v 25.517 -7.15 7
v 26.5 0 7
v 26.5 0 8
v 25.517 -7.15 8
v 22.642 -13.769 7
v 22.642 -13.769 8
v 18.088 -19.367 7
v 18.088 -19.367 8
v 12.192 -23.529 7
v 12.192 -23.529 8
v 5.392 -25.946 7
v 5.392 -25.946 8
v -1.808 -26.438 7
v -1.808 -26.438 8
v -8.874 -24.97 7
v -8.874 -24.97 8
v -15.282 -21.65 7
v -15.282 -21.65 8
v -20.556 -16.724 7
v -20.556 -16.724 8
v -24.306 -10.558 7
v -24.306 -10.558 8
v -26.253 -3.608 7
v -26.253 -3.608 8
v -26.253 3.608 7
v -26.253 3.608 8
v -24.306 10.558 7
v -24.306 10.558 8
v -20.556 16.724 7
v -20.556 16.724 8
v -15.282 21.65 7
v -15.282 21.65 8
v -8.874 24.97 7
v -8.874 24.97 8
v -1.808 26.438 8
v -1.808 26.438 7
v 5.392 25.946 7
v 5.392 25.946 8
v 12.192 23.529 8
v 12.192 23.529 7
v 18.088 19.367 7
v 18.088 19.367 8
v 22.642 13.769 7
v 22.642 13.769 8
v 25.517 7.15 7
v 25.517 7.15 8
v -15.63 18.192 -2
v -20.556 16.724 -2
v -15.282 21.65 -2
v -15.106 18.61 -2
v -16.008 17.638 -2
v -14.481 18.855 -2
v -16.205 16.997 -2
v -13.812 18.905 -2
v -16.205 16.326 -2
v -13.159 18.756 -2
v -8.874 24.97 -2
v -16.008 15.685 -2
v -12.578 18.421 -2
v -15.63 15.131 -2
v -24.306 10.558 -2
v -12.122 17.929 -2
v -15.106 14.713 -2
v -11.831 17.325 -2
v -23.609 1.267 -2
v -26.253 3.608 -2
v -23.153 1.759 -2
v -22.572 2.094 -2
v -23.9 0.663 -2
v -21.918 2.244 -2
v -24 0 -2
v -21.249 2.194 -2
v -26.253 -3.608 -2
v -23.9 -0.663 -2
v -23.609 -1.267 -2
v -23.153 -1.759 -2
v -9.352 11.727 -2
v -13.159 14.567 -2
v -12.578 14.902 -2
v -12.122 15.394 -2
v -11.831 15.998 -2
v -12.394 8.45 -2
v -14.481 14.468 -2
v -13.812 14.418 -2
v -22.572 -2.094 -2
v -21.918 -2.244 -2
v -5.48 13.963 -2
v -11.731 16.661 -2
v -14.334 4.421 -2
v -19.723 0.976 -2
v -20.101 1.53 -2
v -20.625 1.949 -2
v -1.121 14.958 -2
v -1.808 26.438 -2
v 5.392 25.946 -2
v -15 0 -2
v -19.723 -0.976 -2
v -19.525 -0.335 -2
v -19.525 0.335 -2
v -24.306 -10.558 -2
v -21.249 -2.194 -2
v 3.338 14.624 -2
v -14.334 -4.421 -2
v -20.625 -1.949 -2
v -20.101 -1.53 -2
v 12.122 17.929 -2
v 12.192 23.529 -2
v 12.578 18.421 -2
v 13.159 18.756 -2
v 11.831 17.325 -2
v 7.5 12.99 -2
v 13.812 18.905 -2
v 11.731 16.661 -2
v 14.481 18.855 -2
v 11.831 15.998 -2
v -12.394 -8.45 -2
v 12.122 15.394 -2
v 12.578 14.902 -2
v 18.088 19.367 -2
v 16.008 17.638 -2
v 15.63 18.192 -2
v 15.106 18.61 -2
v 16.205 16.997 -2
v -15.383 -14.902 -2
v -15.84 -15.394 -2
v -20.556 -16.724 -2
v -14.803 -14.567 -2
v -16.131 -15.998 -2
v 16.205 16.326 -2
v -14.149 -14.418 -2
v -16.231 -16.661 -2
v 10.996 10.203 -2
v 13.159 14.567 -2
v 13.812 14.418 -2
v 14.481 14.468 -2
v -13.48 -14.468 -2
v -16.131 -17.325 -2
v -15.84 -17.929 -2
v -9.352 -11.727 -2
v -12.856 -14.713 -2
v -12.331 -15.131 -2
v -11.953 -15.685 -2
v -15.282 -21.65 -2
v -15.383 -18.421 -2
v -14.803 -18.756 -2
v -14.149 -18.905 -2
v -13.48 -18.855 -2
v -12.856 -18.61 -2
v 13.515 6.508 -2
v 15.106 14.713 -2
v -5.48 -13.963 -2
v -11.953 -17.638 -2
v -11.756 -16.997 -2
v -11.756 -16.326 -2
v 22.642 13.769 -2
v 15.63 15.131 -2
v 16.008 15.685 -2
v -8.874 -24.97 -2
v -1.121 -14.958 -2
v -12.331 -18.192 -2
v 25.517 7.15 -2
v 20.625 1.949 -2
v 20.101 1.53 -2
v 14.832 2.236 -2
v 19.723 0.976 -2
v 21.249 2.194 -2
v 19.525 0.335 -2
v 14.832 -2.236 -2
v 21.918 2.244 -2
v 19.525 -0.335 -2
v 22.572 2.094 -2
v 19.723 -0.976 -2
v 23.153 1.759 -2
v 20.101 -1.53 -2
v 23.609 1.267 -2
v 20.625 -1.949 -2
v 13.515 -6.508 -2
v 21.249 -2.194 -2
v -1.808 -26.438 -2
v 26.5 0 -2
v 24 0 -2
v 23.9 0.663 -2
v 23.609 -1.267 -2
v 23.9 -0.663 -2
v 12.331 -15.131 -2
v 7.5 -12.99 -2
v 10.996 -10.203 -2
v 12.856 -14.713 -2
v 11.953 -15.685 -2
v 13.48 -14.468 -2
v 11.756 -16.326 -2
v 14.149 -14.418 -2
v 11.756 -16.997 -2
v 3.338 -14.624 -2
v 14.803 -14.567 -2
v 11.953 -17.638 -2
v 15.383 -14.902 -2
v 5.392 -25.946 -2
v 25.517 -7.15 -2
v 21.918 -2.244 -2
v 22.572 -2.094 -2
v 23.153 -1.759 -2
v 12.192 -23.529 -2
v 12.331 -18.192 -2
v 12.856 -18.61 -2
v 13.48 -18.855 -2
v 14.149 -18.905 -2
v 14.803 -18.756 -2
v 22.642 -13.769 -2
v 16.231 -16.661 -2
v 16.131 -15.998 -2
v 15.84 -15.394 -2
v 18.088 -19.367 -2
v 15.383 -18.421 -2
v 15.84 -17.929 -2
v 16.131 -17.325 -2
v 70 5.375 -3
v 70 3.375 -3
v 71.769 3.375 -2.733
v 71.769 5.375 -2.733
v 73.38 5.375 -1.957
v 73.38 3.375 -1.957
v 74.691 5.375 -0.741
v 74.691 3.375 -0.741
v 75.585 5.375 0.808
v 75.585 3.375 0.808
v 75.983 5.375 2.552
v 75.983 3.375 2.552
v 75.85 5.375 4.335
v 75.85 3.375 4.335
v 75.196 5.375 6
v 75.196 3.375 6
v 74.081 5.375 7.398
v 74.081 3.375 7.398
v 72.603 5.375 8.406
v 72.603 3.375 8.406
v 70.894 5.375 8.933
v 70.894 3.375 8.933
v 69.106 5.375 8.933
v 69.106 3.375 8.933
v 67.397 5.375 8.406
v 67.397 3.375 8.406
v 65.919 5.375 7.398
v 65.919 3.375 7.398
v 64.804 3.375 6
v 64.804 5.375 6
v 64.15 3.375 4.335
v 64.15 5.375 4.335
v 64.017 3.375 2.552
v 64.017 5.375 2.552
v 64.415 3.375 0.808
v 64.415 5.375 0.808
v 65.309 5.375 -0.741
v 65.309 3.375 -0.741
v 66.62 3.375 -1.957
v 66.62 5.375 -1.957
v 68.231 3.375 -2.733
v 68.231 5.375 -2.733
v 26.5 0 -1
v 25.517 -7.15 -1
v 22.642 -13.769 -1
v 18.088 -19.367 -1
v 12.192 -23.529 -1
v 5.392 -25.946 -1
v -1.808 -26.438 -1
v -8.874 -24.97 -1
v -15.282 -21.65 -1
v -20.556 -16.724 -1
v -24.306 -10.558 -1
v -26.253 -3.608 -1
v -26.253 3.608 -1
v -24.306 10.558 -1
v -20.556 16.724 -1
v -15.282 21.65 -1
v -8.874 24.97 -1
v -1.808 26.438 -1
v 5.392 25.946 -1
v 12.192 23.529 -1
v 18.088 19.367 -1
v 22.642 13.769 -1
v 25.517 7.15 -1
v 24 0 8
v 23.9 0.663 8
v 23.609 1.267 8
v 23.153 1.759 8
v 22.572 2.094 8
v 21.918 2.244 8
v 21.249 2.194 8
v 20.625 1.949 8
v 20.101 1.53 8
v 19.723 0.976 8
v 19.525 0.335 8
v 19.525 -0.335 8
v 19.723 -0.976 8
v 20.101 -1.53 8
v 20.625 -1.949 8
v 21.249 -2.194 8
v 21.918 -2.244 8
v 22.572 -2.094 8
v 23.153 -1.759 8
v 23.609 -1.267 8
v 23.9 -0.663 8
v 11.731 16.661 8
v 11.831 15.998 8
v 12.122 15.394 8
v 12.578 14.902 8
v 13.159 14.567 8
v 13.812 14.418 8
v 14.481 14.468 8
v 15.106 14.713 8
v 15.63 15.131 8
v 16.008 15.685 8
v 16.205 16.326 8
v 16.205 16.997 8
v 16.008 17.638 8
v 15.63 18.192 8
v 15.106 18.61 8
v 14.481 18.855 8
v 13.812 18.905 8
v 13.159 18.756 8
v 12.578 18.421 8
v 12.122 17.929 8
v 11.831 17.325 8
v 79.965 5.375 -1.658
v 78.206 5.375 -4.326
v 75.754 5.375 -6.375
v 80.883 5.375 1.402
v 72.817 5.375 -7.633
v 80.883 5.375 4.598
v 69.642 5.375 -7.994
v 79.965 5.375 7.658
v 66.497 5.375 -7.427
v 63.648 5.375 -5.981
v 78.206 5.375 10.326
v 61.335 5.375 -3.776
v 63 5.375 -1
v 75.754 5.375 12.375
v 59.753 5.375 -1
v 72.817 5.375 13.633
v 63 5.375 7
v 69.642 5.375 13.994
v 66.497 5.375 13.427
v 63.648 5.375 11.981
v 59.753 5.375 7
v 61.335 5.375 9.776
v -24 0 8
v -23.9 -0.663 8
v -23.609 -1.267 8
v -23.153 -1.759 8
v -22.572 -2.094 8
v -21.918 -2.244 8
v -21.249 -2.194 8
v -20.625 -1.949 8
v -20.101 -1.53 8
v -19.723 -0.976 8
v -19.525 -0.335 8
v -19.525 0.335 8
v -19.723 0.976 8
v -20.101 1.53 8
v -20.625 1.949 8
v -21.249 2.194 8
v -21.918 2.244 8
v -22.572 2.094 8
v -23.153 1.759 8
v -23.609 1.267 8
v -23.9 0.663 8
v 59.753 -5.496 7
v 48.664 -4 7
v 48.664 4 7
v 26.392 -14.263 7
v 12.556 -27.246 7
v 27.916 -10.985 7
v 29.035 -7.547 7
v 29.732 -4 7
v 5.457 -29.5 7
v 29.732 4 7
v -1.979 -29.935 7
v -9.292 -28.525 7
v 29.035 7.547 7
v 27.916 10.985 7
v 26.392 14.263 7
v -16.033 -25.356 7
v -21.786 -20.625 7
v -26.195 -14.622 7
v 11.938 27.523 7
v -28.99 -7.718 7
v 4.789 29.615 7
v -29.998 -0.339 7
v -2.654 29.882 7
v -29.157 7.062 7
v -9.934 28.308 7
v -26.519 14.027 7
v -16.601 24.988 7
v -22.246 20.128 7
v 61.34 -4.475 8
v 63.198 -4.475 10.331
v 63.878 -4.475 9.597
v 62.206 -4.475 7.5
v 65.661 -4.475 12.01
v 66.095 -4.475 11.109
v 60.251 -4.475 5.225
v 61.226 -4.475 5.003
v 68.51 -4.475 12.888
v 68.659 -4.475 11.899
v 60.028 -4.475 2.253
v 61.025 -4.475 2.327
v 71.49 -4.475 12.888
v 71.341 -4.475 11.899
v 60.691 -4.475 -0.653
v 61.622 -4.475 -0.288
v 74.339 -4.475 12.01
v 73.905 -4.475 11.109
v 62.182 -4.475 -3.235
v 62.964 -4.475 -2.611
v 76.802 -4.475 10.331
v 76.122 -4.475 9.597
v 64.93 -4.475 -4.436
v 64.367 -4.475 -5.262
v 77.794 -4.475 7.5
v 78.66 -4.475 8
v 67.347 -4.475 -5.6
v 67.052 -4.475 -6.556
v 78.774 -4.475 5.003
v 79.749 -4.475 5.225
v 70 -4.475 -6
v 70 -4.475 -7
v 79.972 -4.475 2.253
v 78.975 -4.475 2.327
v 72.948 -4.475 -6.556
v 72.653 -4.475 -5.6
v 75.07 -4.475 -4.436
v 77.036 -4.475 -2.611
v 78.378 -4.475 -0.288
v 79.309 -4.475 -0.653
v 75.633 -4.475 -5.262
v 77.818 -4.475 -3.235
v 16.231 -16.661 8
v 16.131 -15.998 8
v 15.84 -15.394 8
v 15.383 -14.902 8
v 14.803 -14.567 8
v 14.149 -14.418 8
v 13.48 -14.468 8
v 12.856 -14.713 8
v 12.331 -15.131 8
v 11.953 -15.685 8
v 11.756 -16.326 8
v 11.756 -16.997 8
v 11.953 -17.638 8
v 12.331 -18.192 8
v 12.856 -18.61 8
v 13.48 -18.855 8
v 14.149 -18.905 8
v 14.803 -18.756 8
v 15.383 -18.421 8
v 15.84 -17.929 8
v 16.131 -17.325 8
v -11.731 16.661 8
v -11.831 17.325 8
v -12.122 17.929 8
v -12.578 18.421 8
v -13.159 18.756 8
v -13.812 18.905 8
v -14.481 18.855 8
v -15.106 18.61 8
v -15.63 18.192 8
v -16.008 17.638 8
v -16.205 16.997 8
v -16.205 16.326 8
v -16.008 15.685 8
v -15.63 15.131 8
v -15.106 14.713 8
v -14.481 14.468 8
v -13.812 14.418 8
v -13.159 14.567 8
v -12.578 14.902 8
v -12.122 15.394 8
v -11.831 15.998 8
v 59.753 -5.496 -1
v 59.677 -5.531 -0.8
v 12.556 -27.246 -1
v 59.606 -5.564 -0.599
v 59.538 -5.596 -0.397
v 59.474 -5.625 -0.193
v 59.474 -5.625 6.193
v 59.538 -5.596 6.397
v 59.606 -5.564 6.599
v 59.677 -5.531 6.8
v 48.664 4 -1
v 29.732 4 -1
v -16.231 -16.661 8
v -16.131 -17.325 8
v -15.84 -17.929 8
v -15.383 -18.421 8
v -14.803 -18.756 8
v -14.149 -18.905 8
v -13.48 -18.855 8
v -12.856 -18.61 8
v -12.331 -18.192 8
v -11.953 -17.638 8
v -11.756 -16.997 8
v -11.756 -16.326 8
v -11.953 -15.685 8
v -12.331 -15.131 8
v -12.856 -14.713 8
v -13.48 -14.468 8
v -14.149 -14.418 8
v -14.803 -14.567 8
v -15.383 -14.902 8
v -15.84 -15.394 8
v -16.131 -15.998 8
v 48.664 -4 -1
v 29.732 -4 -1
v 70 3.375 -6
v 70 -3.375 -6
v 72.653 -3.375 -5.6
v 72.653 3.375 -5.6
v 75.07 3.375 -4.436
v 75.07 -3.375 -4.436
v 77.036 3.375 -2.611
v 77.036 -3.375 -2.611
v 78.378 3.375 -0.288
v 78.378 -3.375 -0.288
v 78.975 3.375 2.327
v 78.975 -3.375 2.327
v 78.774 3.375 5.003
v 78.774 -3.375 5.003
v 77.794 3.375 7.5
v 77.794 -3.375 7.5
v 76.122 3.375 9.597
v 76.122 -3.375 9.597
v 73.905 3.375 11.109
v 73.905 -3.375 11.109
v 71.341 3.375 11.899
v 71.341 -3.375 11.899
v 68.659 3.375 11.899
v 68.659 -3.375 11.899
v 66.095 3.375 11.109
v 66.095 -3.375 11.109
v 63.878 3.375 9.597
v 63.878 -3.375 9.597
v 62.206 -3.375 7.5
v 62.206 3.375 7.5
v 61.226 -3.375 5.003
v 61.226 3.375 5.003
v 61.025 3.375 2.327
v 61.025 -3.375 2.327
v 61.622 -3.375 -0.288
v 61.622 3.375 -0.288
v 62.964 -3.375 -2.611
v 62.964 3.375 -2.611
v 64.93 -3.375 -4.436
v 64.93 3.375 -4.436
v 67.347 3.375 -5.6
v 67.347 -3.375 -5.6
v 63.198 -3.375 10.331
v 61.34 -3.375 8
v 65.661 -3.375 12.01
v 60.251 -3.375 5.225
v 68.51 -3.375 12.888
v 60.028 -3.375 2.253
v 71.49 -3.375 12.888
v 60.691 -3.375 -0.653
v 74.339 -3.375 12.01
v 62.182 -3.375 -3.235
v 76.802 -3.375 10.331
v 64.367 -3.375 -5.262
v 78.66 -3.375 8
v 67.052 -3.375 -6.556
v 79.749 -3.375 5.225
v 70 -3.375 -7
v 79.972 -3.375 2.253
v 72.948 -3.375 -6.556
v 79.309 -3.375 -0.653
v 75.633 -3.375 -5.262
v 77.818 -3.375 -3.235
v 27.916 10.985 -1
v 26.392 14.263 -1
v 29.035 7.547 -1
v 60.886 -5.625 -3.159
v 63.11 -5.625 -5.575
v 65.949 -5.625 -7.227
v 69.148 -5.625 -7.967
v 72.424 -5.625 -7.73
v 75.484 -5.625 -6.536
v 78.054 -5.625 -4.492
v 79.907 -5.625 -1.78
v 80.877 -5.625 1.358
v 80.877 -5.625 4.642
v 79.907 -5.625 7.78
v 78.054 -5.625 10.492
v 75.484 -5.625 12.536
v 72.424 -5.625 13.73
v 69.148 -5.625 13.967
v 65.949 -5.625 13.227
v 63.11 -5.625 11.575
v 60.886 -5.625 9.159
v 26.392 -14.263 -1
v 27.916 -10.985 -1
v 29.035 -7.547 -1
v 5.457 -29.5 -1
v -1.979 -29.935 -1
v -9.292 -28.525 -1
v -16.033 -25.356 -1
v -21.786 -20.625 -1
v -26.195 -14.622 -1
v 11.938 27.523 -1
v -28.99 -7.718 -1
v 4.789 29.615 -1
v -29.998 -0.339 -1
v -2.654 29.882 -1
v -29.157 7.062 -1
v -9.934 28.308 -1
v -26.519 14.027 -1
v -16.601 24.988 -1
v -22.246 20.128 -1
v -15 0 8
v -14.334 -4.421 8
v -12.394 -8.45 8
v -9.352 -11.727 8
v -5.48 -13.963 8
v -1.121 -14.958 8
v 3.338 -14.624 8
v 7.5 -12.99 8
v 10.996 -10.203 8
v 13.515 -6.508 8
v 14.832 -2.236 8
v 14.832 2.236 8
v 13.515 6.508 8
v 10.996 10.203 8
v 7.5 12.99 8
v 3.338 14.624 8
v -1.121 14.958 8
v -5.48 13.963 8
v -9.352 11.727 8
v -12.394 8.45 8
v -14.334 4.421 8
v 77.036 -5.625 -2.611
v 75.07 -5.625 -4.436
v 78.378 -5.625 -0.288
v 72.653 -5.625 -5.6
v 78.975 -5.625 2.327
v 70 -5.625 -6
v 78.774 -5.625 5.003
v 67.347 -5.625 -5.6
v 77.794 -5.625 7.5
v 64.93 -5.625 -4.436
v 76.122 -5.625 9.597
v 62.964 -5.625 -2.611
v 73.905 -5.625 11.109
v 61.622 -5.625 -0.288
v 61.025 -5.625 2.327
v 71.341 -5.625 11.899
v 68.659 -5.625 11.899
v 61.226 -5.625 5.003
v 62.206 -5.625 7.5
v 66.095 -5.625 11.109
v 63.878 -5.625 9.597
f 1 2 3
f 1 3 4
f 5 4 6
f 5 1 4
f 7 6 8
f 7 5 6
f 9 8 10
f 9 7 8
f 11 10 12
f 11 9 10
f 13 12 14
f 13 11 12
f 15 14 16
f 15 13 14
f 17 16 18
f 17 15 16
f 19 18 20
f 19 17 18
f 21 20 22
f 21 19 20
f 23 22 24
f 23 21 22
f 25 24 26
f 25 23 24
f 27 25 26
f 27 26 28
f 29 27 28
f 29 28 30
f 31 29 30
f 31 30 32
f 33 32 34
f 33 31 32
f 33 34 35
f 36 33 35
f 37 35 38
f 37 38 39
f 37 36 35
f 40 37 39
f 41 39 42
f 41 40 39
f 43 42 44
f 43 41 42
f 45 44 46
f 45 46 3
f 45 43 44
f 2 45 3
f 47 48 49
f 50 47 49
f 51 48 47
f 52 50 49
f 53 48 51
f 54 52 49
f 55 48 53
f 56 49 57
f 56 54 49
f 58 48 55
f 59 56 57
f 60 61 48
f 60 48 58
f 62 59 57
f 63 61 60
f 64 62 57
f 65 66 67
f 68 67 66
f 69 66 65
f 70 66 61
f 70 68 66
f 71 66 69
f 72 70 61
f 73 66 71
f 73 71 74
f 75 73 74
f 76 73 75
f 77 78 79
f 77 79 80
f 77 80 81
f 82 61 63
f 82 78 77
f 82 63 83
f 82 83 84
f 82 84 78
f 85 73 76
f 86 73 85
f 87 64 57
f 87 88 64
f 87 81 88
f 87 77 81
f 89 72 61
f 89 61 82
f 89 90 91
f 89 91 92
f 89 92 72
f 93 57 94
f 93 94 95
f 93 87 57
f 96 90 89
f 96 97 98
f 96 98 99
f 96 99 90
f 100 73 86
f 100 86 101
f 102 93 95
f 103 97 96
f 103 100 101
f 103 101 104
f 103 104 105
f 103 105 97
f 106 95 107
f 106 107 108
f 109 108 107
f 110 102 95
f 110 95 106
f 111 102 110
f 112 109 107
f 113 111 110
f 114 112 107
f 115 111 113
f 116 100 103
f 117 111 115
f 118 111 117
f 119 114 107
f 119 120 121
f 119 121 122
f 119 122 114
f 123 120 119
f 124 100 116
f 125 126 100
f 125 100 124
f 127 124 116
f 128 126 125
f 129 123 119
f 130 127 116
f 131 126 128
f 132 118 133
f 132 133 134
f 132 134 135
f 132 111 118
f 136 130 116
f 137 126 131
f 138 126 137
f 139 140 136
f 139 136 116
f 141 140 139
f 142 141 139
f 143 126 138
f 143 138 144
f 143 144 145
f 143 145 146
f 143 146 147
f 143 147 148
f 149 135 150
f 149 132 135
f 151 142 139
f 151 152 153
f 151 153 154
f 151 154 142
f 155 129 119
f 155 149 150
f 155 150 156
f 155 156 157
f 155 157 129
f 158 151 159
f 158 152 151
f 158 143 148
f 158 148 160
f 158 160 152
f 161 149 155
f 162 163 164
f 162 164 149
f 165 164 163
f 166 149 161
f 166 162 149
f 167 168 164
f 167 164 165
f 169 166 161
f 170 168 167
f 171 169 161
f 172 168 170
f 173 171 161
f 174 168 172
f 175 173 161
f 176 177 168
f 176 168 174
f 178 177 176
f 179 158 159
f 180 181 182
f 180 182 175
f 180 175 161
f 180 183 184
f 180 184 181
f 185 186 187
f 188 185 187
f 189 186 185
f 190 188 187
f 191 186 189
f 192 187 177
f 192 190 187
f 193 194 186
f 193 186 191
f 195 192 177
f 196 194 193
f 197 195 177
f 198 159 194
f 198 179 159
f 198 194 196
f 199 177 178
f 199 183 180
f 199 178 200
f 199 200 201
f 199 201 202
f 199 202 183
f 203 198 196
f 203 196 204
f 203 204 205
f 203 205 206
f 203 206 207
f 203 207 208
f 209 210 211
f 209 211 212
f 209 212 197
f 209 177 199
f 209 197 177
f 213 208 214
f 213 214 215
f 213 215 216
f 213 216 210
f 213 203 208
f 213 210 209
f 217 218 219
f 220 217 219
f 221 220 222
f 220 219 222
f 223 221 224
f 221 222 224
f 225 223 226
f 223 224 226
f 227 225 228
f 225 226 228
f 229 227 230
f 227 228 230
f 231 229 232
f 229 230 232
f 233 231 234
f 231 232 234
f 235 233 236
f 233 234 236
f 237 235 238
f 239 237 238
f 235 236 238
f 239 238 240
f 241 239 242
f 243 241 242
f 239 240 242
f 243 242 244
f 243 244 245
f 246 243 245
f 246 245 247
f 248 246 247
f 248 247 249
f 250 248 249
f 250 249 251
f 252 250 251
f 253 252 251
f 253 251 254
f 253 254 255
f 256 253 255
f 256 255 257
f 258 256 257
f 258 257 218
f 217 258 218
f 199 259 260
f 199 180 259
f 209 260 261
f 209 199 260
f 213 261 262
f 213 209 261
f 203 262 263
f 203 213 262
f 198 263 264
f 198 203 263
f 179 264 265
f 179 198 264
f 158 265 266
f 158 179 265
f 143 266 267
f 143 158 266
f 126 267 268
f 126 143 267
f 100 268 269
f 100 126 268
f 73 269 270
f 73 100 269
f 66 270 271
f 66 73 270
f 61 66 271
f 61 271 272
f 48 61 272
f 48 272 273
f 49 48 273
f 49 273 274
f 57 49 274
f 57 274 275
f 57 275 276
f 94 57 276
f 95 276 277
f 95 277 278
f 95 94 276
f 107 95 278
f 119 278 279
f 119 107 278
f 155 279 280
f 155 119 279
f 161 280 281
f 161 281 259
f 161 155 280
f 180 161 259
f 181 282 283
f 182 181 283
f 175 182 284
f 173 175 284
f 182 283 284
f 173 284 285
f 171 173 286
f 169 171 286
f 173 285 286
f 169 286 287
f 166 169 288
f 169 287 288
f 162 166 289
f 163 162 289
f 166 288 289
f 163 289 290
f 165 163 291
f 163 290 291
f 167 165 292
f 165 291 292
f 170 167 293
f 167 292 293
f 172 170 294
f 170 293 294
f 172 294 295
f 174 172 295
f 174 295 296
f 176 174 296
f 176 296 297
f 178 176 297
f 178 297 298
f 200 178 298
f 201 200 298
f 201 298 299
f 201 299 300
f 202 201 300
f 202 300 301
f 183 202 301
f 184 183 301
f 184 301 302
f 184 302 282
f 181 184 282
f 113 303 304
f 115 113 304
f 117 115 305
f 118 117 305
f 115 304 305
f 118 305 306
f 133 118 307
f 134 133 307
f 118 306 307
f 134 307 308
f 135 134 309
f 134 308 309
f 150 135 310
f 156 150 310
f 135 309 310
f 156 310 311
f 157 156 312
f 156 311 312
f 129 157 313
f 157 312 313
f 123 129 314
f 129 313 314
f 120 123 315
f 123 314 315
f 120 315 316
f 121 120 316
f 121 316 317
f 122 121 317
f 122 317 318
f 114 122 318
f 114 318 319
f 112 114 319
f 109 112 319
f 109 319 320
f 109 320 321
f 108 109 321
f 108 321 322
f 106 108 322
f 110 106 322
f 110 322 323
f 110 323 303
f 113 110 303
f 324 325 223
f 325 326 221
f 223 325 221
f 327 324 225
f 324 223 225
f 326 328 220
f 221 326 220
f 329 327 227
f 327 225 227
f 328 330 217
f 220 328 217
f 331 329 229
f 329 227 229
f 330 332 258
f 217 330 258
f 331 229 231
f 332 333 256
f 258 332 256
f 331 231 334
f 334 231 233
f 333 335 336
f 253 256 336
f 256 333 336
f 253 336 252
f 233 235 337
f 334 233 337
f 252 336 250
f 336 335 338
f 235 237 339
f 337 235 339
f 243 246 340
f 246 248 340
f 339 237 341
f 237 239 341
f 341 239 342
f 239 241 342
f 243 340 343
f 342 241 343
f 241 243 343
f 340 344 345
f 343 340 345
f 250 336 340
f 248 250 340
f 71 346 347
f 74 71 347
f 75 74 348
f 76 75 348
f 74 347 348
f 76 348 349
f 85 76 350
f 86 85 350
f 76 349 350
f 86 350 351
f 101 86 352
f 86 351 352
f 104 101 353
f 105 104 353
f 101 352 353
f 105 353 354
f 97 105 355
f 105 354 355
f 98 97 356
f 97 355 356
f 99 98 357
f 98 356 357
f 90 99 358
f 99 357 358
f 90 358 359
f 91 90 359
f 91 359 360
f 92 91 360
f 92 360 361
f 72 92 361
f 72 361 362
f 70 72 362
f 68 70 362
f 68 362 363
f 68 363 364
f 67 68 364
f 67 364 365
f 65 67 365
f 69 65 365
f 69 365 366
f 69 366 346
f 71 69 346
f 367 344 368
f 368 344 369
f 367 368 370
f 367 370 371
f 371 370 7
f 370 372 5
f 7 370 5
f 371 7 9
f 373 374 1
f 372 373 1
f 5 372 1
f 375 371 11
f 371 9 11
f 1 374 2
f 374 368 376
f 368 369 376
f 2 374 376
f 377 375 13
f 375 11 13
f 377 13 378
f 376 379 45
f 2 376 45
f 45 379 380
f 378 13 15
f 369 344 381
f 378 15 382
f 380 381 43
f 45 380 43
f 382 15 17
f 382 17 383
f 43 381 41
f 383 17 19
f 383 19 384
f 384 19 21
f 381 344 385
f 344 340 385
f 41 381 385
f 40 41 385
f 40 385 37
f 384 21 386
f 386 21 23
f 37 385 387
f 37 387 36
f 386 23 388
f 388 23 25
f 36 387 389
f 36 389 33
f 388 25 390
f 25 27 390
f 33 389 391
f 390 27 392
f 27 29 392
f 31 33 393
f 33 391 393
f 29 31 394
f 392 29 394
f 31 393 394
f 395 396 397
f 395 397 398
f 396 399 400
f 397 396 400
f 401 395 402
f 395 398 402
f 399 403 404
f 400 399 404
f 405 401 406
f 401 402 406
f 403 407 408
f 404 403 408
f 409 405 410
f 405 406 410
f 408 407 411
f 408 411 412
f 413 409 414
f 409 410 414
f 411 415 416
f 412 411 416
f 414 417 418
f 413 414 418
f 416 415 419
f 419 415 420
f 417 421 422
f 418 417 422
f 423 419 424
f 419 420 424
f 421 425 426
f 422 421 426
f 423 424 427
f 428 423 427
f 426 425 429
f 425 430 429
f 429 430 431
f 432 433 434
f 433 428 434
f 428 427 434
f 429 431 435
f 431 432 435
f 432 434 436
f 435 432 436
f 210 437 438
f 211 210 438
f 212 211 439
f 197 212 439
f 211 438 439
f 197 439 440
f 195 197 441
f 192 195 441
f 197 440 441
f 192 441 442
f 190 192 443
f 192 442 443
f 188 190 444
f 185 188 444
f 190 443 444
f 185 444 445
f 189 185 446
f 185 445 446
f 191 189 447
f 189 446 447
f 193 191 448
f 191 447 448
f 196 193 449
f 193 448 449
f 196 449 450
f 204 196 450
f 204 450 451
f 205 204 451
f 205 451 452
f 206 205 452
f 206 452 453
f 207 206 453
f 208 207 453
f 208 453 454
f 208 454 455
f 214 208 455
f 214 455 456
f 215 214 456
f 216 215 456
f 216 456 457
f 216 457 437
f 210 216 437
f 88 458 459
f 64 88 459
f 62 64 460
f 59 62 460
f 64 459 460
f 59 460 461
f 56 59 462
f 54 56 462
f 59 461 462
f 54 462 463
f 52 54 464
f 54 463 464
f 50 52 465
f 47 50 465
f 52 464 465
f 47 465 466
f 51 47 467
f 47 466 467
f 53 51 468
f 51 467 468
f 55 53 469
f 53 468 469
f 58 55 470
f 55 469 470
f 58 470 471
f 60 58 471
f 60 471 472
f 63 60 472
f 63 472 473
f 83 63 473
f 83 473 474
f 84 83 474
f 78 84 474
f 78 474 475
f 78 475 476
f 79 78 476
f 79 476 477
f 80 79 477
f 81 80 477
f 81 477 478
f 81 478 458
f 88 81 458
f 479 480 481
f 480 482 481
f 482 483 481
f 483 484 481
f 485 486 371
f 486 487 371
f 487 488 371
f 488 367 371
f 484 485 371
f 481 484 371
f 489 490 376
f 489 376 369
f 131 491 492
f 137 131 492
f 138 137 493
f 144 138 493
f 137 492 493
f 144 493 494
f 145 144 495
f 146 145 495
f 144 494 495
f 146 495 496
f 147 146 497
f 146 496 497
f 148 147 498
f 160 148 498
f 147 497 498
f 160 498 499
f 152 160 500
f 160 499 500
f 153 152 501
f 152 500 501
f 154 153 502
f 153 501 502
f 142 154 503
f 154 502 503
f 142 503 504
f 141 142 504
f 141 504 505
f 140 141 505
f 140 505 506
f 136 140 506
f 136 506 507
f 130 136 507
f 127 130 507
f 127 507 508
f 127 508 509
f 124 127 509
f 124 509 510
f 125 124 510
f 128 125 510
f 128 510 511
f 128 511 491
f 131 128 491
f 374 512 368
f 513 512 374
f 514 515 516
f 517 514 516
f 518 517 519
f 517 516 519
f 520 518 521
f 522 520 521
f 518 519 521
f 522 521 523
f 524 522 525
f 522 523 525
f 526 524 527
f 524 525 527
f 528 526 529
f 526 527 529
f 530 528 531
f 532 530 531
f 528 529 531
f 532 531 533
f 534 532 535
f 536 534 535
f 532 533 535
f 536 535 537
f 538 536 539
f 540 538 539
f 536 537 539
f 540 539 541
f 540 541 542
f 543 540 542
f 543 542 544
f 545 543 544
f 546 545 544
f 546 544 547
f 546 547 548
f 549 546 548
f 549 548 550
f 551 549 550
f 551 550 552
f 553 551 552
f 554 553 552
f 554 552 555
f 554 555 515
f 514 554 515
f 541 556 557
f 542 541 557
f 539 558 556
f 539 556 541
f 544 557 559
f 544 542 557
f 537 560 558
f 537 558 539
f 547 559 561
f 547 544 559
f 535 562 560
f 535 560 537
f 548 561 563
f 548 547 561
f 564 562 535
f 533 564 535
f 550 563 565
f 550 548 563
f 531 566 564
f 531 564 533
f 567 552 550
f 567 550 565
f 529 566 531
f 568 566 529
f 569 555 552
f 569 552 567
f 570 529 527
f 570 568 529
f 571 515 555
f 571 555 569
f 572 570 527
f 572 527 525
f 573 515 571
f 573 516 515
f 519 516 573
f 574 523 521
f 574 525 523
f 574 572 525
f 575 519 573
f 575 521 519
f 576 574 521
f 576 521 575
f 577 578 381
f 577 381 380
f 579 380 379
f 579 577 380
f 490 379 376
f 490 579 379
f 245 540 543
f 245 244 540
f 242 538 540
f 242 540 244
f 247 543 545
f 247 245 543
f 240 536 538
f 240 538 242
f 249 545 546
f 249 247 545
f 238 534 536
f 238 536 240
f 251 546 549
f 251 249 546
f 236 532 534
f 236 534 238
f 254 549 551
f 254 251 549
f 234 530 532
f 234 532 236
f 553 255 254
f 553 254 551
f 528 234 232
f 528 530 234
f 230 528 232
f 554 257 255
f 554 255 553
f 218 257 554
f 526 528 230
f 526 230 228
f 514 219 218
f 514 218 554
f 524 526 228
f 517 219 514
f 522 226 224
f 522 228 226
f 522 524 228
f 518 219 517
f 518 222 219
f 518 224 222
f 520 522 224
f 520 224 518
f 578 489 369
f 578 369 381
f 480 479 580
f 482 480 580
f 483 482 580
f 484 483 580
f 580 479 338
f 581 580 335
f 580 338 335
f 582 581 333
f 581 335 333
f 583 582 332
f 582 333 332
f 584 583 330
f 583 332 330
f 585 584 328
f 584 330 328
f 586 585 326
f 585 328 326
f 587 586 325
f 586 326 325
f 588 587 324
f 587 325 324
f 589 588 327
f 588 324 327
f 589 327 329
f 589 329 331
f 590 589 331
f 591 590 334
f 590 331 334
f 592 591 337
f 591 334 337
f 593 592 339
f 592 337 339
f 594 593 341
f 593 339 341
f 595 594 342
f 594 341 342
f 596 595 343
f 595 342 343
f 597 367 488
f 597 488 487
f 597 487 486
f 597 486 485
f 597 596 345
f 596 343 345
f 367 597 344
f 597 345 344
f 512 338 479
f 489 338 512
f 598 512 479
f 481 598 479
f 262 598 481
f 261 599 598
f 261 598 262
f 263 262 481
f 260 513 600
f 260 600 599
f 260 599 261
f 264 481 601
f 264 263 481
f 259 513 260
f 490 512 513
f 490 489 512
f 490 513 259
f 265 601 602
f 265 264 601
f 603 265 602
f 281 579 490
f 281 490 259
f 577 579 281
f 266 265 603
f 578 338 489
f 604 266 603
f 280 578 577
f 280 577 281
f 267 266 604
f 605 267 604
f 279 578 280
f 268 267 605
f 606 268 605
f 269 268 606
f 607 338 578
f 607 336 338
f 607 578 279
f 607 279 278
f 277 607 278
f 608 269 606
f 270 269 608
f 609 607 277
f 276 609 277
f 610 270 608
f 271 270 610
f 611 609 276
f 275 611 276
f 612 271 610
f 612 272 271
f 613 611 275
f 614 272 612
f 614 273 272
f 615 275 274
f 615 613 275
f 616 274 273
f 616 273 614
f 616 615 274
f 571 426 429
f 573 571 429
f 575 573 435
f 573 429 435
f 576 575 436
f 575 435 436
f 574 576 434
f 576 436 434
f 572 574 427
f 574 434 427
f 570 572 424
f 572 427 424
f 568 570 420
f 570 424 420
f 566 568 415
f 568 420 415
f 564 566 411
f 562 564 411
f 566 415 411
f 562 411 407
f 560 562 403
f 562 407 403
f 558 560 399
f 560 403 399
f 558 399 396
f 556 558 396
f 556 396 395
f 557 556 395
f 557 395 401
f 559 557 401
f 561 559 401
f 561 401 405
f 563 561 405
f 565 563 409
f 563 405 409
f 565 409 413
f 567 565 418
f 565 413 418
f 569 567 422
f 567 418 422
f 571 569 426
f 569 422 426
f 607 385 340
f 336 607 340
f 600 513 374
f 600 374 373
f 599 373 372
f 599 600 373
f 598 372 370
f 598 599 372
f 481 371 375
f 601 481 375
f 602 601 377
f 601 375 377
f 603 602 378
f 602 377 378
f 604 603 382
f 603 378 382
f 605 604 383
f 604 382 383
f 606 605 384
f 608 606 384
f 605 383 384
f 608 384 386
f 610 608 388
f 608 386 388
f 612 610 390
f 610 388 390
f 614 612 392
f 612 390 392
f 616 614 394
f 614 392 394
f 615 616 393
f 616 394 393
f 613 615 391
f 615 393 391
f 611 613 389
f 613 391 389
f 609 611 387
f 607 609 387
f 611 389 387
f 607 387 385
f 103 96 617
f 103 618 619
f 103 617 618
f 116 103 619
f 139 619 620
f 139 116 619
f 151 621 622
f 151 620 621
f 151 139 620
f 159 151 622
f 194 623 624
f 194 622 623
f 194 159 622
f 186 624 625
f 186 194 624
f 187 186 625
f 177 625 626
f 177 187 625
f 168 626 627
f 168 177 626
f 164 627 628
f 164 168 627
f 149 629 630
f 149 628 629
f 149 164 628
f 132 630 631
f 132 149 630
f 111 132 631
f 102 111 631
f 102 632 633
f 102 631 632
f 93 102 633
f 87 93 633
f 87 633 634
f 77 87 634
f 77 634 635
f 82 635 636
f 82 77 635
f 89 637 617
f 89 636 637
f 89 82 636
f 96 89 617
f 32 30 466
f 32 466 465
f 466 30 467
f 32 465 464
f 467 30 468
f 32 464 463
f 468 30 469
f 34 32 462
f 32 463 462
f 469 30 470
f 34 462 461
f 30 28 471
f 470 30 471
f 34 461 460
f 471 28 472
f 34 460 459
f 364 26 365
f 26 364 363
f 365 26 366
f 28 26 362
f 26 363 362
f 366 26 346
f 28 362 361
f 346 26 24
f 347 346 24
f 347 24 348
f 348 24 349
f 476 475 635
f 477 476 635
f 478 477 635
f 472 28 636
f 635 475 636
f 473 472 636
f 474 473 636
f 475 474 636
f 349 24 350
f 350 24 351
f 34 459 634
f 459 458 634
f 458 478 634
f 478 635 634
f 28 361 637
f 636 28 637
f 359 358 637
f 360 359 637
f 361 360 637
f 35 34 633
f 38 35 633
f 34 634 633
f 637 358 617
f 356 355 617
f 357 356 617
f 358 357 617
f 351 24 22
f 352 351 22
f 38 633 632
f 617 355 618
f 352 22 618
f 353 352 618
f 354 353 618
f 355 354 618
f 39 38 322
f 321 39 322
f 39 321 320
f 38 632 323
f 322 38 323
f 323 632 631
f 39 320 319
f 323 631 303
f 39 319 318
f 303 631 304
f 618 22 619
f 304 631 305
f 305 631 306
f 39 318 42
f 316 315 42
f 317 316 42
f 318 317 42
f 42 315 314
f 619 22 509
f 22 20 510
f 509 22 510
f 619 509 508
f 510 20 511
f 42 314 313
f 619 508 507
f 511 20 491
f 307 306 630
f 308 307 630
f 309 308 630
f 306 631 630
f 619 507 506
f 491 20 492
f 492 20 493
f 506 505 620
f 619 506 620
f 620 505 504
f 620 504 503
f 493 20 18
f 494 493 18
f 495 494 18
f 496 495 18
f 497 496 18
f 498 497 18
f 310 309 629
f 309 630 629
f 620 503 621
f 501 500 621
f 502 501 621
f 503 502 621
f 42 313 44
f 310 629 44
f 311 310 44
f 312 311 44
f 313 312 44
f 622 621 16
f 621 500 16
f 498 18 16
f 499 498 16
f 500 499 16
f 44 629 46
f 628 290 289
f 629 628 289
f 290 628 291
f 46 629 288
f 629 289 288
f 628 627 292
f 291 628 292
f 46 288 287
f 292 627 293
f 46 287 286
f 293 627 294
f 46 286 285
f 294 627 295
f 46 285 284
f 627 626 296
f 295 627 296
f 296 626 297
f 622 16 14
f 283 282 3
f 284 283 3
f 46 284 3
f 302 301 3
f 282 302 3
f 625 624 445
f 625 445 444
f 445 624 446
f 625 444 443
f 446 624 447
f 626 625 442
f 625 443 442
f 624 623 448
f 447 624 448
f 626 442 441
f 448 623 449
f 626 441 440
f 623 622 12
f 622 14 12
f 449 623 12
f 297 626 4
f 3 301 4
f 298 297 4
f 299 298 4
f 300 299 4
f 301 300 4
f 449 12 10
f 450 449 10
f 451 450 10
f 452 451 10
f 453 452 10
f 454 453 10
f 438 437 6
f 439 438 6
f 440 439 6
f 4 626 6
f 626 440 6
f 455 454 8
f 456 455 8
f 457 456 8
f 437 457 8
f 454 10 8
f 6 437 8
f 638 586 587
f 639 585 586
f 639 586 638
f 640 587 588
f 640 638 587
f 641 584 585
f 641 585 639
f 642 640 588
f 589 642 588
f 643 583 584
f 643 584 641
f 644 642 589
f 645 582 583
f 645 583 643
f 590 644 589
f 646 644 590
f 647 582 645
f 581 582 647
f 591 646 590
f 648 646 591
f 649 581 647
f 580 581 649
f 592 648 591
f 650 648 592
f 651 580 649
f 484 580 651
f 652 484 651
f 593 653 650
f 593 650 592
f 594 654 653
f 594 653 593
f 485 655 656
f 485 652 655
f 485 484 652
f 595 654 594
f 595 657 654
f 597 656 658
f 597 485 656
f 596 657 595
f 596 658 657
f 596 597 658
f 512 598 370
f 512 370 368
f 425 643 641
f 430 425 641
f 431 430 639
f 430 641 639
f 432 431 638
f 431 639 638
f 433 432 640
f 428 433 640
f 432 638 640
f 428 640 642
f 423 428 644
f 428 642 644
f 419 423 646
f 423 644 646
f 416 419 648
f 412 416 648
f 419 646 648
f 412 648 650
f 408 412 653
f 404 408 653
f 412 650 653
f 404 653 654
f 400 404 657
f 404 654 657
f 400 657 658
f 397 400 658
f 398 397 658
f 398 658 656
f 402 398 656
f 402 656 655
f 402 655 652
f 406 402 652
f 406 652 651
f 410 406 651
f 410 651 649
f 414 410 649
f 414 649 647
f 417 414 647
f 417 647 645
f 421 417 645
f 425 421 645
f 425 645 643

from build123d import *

# Parameters (mm, degrees)
SKETCH_1_R               = 30
EXTRUDE_1_DEPTH          = 3
SKETCH_2_W               = 11
SKETCH_2_H               = 11
EXTRUDE_2_DEPTH          = 4
SKETCH_4_R               = 6
CUT_EXTRUDE_1_DEPTH      = 25
SKETCH_5_R               = 9
CUT_EXTRUDE_2_DEPTH      = 9
CUT_EXTRUDE_START        = 7.85
SKETCH_6_R               = 10
SKETCH_6_R_2             = 9
CUT_EXTRUDE_3_DEPTH      = 1.1
SKETCH_8_R               = 26.5
EXTRUDE_3_DEPTH          = 5
CUT_EXTRUDE_4_DEPTH      = 88.669835177
CUT_EXTRUDE_4_DEPTH_BACK = 88.669835177
SKETCH_7_R               = 15
SKETCH_10_R              = 2.25
CUT_EXTRUDE_5_DEPTH      = 17


with BuildPart() as part:
    # 草图1 → 凸台-拉伸1 (new body)
    with BuildSketch(Plane.XY):
        Circle(SKETCH_1_R)
    extrude(amount=EXTRUDE_1_DEPTH)



with BuildPart() as body_2:
    # 草图2 → 旋转1 (revolve)
    with BuildSketch(Plane.XY.offset(3), mode=Mode.PRIVATE) as revolve_1_sk:
        with Locations((64.5, -0.125)):
            Rectangle(SKETCH_2_W, SKETCH_2_H)
    revolve(revolve_1_sk.sketch.rotate(Axis((70, 22.717290725, 3), (0, -1, 0)), 270), axis=Axis((70, 22.717290725, 3), (0, -1, 0)))


with BuildPart() as part_1:
    add(part.part)

    add(body_2.part)  # 凸台-拉伸2 merges body 2
    # 草图3 → 凸台-拉伸2 (add, symmetric)
    with BuildSketch(Plane.XY.offset(3)):
        with BuildLine():
            Line((11.937553945, 27.522623527), (63, 5.375))
            Line((63, 5.375), (63, -4))
            Line((63, -4), (12.555800964, -27.246134811))
            ThreePointArc((12.555800964, -27.246134811), (-29.998088792, -0.338627888), (11.937553945, 27.522623527))
        make_face()
    extrude(amount=EXTRUDE_2_DEPTH, both=True)

    # 草图4 → 切除-拉伸1 (cut)
    with BuildSketch(Plane.XZ.offset(5.625)):
        with Locations(Location((70, 3, 0), (0, 0, 270))):
            Circle(SKETCH_4_R)
    extrude(amount=-CUT_EXTRUDE_1_DEPTH, mode=Mode.SUBTRACT)

    # 草图5 → 切除-拉伸2 (cut)
    with BuildSketch(Plane.XZ.offset(5.625)):
        with Locations(Location((70, 3, 0), (0, 0, 270))):
            Circle(SKETCH_5_R)
    extrude(amount=-CUT_EXTRUDE_2_DEPTH, mode=Mode.SUBTRACT)

    # 草图6 → 切除-拉伸3 (cut)
    # profile 1 of 2: a face of its own
    with BuildSketch(Plane.XZ.offset(-3.375).offset(CUT_EXTRUDE_START)):
        with Locations(Location((70, 3, 0), (0, 0, 270))):
            Circle(SKETCH_6_R)
        with Locations(Location((70, 3, 0), (0, 0, 270))):
            Circle(SKETCH_6_R_2, mode=Mode.SUBTRACT)
    # profile 2 of 2: a face of its own
    with BuildSketch(Plane.XZ.offset(-3.375).offset(CUT_EXTRUDE_START)):
        with Locations(Location((70, 3, 0), (0, 0, 270))):
            Circle(SKETCH_6_R_2)
    extrude(amount=-CUT_EXTRUDE_3_DEPTH, mode=Mode.SUBTRACT)

    # 草图8 → 凸台-拉伸3 (add, symmetric)
    with BuildSketch(Plane(origin=(0, 0, 3), x_dir=(-1, 0, 0), z_dir=(0, 0, -1))):
        with Locations(Location((0, 0, 0), (0, 0, 180))):
            Circle(SKETCH_8_R)
    extrude(amount=EXTRUDE_3_DEPTH, both=True)

    # 草图7 → 切除-拉伸4 (cut, two sides: drawn at the far end of the back side and taken through both)
    with BuildSketch(Plane.XY.offset(7).offset(-CUT_EXTRUDE_4_DEPTH_BACK)):
        with Locations(Location((0, 0, 0), (0, 0, 180))):
            Circle(SKETCH_7_R)
        with BuildLine():
            Line((26.392321658, -14.26342727), (48.663997023, -4))
            Line((48.663997023, -4), (29.732137495, -4))
            ThreePointArc((29.732137495, -4), (28.527586888, -9.283145284), (26.392321658, -14.26342727))
        make_face()
        with BuildLine():
            Line((29.732137495, 4), (48.663997023, 4))
            Line((48.663997023, 4), (26.392321658, 14.26342727))
            ThreePointArc((26.392321658, 14.26342727), (28.527586888, 9.283145284), (29.732137495, 4))
        make_face()
    extrude(amount=CUT_EXTRUDE_4_DEPTH + CUT_EXTRUDE_4_DEPTH_BACK, mode=Mode.SUBTRACT)

    # 草图10 → 切除-拉伸5 (cut)
    with BuildSketch(Plane.XY.offset(8)):
        with Locations((21.75, 0)):
            Circle(SKETCH_10_R)
        with Locations((13.980630511, -16.661466638)):
            Circle(SKETCH_10_R)
        with Locations(Location((-21.75, 0, 0), (0, 0, 180))):
            Circle(SKETCH_10_R)
        with Locations(Location((-13.980630511, -16.661466638, 0), (0, 0, 180))):
            Circle(SKETCH_10_R)
        with Locations(Location((13.980630511, 16.661466638, 0), (0, 0, 180))):
            Circle(SKETCH_10_R)
        with Locations((-13.980630511, 16.661466638)):
            Circle(SKETCH_10_R)
    extrude(amount=-CUT_EXTRUDE_5_DEPTH, mode=Mode.SUBTRACT)


solid = part_1.part
